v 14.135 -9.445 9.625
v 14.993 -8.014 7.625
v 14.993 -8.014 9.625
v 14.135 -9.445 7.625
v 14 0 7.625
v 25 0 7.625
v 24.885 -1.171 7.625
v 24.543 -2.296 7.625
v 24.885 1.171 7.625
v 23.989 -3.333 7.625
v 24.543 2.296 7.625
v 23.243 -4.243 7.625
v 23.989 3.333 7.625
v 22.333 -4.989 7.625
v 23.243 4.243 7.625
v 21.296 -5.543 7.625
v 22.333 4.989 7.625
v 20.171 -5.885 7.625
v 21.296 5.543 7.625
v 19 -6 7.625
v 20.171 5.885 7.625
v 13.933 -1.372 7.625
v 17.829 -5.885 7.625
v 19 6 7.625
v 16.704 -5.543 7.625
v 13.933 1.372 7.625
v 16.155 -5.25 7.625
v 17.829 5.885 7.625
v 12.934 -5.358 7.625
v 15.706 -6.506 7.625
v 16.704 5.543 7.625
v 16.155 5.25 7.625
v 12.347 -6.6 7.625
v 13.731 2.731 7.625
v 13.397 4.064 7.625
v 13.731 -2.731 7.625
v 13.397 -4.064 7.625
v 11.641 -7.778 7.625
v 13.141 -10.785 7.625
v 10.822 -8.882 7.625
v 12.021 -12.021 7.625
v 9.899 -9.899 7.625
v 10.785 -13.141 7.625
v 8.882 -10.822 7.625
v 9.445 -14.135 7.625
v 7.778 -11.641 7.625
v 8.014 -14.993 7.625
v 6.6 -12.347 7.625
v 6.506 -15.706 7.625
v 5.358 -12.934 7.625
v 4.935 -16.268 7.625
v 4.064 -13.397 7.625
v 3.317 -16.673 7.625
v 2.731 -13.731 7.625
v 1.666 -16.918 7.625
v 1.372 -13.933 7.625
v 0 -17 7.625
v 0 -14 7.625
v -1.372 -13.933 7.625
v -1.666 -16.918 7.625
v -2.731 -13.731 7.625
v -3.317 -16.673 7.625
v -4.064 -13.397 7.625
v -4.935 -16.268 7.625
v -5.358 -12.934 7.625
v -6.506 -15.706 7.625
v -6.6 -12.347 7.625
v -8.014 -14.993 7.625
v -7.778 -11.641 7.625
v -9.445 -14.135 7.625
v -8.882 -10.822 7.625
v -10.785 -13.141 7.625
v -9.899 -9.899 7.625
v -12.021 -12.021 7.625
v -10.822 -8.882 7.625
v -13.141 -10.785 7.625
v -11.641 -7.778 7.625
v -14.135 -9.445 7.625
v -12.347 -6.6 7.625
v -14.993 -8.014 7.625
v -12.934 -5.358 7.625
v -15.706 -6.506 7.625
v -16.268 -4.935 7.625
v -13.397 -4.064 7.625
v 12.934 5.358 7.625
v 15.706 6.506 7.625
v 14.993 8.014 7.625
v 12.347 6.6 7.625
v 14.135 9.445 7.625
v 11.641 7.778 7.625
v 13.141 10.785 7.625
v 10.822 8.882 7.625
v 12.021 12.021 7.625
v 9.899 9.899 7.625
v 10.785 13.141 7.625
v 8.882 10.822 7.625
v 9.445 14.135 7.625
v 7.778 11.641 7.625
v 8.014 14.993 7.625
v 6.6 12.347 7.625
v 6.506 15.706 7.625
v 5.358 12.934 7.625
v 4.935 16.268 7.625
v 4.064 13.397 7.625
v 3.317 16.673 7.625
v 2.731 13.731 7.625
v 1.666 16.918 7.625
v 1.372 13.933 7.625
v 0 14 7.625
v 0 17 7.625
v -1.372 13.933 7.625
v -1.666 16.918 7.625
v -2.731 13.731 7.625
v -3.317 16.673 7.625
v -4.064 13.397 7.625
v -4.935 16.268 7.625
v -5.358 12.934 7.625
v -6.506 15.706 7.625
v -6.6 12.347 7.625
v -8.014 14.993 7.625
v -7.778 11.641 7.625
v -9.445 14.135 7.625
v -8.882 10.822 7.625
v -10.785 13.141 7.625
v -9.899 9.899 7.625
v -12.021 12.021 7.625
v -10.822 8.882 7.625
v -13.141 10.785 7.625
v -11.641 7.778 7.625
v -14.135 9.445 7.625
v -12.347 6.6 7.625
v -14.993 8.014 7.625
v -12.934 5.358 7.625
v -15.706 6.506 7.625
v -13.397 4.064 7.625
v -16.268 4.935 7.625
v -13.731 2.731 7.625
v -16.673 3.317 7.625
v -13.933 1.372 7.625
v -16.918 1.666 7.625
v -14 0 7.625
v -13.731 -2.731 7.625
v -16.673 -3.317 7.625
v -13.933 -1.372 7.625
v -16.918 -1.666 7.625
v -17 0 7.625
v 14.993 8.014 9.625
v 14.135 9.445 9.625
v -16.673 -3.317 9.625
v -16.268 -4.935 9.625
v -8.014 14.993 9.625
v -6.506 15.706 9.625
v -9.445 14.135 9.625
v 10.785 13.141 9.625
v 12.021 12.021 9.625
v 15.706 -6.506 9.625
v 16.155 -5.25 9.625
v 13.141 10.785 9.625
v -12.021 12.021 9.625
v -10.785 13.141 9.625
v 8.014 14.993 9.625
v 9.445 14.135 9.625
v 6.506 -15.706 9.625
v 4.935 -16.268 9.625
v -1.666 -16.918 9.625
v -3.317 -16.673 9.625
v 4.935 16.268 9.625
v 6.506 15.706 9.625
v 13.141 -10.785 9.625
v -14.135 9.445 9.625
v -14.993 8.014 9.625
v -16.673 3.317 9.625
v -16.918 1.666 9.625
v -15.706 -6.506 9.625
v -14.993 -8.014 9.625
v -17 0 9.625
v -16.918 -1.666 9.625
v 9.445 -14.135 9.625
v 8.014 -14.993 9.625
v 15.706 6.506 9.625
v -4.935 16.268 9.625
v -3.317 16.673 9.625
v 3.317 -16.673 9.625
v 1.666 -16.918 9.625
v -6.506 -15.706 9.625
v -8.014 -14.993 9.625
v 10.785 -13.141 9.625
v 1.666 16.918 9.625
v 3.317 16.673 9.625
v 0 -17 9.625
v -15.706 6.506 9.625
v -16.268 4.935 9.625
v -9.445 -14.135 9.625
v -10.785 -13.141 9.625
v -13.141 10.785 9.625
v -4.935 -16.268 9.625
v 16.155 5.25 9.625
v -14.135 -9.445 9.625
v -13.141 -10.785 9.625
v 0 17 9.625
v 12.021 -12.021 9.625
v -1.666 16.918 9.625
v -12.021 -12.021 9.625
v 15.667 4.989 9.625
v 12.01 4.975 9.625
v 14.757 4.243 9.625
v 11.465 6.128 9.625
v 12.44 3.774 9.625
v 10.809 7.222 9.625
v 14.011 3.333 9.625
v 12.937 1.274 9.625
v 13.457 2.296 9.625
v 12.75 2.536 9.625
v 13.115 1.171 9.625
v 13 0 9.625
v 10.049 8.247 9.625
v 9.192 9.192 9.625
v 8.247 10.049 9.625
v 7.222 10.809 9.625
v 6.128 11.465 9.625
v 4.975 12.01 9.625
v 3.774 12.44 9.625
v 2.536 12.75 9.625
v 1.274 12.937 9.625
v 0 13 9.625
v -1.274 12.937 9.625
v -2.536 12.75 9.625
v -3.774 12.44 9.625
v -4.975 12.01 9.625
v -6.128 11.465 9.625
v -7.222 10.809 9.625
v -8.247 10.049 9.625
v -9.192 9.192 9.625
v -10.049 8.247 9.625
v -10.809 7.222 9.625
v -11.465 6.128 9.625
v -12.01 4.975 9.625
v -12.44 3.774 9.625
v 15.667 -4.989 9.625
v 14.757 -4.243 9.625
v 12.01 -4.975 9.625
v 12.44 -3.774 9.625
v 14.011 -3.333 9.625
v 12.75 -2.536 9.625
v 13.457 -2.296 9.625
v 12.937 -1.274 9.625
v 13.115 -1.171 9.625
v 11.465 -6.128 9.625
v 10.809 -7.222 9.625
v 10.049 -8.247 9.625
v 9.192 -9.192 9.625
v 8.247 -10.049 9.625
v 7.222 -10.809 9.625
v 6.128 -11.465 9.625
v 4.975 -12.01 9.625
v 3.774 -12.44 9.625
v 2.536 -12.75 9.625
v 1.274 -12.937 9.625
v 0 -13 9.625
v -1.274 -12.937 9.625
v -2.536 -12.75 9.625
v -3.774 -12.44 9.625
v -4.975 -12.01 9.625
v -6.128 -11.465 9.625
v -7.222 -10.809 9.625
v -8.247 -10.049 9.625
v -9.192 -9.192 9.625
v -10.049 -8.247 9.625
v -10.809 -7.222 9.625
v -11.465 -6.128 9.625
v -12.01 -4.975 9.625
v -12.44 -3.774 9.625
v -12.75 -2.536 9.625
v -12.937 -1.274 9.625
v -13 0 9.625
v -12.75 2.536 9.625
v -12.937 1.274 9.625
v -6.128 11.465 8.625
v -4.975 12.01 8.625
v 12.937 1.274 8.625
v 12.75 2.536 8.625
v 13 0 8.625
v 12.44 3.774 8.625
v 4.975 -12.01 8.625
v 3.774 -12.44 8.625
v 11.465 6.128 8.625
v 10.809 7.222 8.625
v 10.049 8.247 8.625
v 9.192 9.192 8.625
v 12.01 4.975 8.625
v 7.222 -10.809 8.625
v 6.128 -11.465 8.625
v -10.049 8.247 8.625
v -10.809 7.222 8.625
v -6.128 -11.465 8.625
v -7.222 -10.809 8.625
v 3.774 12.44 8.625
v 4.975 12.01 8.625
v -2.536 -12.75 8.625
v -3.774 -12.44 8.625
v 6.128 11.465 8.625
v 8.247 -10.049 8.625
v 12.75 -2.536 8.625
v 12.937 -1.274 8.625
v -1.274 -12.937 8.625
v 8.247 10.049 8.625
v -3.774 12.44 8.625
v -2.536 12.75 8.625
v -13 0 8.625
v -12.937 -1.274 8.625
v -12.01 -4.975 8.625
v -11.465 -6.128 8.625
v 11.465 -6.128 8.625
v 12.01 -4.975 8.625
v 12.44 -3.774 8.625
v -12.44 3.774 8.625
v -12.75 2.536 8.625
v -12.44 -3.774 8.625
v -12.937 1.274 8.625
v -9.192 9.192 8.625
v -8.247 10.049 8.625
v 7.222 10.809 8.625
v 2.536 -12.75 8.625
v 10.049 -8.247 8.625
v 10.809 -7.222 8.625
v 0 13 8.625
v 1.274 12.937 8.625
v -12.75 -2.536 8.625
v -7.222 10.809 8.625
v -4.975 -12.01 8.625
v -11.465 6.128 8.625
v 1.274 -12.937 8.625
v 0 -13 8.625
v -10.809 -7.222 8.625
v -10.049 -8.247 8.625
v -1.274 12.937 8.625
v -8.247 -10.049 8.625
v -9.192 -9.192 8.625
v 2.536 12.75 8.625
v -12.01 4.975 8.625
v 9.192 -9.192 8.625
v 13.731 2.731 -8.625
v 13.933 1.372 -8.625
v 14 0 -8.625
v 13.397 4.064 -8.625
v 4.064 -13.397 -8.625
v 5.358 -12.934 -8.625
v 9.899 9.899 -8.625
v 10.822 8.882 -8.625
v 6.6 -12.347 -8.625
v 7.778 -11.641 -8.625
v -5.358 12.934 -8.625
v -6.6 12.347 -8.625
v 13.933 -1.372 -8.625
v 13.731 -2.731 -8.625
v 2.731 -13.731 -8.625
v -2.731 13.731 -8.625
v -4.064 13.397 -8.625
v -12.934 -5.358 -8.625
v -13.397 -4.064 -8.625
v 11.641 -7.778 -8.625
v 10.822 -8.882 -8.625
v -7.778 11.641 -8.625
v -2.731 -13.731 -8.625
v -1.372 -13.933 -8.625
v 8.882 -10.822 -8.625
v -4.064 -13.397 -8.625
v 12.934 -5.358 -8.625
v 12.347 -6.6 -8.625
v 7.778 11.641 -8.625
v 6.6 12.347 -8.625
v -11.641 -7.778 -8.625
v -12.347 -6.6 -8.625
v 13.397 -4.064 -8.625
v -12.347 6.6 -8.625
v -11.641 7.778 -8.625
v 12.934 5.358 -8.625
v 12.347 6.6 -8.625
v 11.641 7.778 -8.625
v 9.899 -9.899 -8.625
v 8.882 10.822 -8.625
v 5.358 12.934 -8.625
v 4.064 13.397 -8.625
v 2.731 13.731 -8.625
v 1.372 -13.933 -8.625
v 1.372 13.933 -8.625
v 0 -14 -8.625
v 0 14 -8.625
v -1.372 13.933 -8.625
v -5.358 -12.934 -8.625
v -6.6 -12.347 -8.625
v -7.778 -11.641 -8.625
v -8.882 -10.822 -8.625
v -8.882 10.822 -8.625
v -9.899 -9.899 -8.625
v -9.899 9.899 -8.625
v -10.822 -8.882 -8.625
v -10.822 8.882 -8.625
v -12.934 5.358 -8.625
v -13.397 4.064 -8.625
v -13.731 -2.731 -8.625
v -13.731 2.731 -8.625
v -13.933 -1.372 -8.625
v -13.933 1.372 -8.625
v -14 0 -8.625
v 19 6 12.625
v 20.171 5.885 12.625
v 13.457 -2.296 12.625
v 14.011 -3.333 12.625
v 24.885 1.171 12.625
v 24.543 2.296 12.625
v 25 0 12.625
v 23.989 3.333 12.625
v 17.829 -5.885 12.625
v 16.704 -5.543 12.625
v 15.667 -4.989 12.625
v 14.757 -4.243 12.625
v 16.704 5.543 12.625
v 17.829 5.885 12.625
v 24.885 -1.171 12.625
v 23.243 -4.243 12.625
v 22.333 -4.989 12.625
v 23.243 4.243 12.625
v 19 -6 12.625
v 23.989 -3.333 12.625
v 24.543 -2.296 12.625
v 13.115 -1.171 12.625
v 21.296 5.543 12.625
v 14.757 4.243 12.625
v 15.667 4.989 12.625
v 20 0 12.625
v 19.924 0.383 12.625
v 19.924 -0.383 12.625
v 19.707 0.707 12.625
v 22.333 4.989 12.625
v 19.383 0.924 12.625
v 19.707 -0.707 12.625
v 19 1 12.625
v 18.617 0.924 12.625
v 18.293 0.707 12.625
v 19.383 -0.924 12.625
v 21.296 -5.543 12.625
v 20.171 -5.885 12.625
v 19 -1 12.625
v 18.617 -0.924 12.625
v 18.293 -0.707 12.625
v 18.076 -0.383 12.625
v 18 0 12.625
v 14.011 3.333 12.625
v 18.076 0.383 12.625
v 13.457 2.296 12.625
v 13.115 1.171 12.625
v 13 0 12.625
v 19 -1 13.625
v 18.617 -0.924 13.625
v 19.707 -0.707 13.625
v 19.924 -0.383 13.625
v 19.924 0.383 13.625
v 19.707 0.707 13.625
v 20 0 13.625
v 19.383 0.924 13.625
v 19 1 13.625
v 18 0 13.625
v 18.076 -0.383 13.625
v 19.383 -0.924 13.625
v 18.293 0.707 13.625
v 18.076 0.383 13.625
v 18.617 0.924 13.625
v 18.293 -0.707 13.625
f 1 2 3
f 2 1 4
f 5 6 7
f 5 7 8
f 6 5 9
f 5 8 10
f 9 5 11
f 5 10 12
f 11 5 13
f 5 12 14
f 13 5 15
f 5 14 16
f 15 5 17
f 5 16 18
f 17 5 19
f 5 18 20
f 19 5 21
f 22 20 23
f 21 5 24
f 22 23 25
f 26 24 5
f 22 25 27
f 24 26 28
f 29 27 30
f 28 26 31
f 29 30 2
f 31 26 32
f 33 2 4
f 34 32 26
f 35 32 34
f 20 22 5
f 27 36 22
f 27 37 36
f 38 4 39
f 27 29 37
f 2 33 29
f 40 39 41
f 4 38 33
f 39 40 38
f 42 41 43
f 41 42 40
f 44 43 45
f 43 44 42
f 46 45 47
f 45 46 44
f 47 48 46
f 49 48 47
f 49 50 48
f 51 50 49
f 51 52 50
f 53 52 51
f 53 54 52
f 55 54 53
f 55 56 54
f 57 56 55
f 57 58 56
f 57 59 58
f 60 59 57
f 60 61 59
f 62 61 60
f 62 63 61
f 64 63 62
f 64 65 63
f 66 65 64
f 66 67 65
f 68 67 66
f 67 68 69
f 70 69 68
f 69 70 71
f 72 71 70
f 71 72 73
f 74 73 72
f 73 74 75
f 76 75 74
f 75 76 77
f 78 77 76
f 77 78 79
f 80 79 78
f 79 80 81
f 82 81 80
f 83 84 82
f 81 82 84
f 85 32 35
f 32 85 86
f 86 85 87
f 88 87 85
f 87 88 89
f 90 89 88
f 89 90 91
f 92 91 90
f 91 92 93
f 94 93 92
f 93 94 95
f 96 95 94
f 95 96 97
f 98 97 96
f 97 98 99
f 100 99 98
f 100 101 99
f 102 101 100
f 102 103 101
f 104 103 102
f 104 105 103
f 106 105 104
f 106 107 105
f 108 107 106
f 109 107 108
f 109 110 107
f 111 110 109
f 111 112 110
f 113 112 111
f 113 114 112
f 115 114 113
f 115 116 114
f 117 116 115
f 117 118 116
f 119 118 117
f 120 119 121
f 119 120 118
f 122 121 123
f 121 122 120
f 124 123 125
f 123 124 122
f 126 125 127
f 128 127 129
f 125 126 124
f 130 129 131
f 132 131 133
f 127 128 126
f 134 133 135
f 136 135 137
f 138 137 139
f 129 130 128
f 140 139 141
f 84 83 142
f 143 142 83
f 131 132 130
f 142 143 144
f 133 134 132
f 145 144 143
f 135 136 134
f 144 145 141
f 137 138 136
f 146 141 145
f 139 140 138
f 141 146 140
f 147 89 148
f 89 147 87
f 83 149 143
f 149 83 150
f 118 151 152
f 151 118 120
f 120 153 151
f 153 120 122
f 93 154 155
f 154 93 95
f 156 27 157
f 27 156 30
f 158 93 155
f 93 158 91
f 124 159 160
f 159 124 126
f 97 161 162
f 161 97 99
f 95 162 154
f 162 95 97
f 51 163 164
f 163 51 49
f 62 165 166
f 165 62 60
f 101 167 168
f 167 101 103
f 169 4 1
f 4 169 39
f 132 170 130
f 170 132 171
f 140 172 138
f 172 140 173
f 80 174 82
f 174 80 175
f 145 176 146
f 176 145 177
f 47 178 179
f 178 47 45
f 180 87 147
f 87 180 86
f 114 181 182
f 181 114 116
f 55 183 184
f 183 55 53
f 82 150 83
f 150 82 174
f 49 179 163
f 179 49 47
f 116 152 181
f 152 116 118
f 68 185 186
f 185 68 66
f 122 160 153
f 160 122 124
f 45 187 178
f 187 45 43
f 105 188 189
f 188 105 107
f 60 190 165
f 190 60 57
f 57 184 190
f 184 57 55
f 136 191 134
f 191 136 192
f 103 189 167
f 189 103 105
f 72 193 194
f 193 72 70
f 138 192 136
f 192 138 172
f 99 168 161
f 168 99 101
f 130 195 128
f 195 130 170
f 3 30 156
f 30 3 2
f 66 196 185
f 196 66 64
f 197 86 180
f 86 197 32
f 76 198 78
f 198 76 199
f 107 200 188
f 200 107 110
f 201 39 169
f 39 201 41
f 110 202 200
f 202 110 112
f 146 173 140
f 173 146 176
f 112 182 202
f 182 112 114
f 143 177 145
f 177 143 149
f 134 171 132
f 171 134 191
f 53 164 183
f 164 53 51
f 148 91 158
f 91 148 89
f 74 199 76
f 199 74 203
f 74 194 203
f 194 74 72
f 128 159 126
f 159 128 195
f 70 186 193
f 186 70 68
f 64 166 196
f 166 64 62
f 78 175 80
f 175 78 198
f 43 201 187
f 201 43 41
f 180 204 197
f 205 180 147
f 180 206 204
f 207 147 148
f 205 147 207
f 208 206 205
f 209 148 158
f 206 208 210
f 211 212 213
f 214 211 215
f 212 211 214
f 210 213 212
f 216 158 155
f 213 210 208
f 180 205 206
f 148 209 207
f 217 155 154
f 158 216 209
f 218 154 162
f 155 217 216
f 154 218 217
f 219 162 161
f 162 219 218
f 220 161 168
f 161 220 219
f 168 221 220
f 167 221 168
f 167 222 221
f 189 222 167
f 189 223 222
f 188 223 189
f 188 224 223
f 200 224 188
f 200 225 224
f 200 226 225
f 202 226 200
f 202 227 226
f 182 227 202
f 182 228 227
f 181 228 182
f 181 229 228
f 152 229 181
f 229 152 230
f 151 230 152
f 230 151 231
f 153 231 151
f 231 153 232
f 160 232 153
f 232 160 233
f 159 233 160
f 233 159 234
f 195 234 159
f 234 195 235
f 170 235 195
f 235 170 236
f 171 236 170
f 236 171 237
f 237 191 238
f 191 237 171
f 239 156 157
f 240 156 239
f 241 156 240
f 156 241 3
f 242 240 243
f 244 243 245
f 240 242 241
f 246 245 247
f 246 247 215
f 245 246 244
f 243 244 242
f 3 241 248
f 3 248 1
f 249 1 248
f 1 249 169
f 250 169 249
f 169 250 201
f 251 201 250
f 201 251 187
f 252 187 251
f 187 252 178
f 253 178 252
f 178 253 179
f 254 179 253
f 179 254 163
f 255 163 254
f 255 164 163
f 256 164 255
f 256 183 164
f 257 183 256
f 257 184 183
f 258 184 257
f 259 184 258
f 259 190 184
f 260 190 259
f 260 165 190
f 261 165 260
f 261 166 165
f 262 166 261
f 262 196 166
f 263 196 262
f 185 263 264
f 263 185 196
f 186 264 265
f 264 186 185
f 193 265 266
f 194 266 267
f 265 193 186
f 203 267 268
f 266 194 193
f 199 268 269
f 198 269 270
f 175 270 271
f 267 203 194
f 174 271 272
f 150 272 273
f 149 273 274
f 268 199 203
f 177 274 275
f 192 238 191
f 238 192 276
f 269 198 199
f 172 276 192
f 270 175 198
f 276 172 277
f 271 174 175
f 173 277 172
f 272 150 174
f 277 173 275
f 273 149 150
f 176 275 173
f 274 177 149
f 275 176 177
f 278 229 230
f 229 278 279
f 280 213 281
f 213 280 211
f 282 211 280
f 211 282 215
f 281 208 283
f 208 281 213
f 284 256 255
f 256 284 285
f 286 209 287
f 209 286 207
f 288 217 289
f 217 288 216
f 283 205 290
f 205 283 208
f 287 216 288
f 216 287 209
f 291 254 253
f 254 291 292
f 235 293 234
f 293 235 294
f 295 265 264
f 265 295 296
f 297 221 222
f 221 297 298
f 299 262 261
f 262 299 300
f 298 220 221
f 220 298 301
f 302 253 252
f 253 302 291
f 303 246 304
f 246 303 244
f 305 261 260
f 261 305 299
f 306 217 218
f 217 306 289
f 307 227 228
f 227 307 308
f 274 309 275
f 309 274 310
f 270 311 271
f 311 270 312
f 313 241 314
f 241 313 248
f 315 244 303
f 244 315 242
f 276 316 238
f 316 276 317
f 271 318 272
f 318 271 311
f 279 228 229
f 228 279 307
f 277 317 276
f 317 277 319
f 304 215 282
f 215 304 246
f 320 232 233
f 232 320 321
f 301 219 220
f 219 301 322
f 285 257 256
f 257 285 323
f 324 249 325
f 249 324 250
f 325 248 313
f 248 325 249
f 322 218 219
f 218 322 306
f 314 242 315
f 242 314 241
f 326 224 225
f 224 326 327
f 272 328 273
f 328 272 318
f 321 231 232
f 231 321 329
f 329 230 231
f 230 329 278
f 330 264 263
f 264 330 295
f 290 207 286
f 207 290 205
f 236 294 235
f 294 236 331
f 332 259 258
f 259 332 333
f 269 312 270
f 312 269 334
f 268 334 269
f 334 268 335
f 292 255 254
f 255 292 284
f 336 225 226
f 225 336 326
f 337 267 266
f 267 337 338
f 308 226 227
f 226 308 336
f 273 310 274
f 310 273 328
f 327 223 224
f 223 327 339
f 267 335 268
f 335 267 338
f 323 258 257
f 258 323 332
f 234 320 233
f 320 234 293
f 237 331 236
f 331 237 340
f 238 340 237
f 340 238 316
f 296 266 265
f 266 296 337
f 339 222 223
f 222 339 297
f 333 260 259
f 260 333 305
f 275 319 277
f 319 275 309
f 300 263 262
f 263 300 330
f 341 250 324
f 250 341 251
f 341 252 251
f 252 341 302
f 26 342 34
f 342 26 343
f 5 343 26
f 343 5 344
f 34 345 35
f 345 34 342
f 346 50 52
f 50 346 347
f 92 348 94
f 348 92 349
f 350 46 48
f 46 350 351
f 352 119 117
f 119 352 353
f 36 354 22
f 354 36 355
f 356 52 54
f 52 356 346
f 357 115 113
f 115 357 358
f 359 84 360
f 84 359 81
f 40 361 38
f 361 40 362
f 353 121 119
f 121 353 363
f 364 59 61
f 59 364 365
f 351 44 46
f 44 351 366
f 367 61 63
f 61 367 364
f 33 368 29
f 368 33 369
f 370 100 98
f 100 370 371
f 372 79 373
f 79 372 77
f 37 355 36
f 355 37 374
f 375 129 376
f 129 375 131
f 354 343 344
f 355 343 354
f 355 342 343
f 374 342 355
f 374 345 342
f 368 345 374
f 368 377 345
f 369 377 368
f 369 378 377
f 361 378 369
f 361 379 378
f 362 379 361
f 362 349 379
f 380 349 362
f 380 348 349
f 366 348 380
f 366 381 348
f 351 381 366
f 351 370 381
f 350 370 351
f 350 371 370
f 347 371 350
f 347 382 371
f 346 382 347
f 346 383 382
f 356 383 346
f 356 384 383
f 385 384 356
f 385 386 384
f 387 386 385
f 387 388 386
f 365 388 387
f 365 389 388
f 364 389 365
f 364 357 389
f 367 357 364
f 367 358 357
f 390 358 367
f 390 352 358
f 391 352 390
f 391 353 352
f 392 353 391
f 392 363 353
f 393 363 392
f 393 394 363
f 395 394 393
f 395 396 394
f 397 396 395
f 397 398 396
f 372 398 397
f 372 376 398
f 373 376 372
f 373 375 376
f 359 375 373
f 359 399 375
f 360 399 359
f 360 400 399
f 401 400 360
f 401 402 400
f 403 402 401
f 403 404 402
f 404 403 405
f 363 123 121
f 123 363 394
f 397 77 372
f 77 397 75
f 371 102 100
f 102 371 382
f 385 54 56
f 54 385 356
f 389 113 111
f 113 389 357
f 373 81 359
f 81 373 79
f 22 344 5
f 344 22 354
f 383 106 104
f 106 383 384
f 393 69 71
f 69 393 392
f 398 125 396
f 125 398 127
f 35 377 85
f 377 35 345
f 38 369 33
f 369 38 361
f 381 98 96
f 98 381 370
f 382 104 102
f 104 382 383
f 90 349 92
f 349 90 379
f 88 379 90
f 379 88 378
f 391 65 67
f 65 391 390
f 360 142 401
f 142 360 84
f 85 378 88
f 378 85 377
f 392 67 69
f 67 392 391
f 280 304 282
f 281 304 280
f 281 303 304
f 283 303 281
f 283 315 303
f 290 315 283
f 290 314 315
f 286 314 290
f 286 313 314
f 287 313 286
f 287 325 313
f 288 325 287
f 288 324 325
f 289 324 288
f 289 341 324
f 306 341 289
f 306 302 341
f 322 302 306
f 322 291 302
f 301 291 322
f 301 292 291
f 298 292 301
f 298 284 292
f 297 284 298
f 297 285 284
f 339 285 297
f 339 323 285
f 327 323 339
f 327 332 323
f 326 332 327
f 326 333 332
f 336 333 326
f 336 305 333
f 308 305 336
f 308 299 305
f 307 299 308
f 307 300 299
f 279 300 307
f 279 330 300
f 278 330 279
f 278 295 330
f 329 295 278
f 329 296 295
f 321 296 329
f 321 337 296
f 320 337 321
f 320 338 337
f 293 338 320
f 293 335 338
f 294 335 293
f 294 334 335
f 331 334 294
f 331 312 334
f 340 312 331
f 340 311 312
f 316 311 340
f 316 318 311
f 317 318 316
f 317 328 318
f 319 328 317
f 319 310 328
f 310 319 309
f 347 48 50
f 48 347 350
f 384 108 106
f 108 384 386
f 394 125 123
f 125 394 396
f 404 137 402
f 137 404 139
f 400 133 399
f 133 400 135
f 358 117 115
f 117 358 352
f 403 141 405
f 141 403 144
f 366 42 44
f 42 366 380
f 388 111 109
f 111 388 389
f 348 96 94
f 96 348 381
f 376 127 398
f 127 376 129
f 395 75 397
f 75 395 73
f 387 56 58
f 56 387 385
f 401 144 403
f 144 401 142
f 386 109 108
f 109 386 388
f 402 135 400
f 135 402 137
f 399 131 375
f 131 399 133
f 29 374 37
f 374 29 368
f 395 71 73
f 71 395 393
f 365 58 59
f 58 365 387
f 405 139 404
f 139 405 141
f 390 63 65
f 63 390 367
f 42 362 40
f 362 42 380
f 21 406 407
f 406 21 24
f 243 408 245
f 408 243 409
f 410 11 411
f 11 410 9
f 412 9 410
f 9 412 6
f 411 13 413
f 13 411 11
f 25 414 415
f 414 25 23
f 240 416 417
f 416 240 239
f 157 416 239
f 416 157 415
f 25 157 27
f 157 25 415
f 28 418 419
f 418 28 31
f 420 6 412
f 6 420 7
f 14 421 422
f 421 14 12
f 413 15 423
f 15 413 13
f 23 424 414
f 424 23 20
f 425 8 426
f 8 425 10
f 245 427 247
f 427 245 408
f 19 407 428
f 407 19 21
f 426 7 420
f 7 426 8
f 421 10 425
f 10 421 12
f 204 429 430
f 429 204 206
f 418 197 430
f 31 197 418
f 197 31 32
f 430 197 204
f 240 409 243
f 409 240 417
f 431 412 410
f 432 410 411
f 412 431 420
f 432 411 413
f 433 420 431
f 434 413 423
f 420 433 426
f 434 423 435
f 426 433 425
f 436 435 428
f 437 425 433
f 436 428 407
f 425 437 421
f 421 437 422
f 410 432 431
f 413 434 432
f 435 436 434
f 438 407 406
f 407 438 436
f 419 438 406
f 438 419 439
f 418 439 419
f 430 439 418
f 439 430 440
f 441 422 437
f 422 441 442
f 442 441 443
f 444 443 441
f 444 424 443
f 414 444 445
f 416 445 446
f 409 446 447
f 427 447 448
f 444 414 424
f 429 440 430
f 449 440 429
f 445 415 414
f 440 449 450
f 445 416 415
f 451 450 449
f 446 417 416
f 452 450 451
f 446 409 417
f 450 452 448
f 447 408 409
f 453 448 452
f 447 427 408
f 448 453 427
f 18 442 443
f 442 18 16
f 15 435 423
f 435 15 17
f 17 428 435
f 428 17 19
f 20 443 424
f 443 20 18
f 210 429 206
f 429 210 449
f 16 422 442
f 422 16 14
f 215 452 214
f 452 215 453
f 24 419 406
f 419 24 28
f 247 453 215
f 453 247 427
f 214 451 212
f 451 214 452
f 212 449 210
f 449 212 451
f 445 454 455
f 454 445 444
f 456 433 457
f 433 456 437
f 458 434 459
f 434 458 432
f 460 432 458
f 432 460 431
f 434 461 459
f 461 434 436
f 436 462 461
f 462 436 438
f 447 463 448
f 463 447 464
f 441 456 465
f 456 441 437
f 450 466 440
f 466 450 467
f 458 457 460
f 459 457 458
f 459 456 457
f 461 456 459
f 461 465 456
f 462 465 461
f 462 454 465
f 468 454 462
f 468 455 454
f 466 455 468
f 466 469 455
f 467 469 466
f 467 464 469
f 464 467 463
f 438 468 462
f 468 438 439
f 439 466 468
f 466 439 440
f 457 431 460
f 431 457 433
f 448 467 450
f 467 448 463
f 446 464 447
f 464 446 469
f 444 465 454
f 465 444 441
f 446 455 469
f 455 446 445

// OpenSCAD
// Parameters
stator_diameter_mm = 28.0; //[14.0:56.0:0.5]
stator_height_mm = 17.25; //[8.0:35.0:0.25]
tolerance_mm = 0.2; //[0.0:1.0:0.05]
overlap_mm = 1.0; //[0.5:2.0:0.1]
central_bore_diameter_mm = 0.0; //[0.0:12.0:0.1]
shaft_diameter_mm = 0.0; //[0.0:12.0:0.1]
end_face_thickness_mm = 1.0; //[0.5:3.0:0.1]
mount_ring_thickness_mm = 2.0; //[1.0:6.0:0.25]
mount_ring_radial_mm = 3.0; //[1.0:10.0:0.25]
buzzer_diameter_mm = 12.0; //[6.0:24.0:0.5]
buzzer_height_mm = 5.0; //[2.0:12.0:0.25]
buzzer_pin_diameter_mm = 2.0; //[1.0:3.0:0.1]
buzzer_pin_height_mm = 2.0; //[0.5:6.0:0.25]

// Buzzer - complete geometry
module buzzer() {
  color([0.85, 0.85, 0.8]) {
    // Buzzer body
    translate([stator_diameter_mm/2 + buzzer_diameter_mm/2 - overlap_mm, 0, stator_height_mm/2 + buzzer_height_mm/2 - overlap_mm])
      cylinder(r=buzzer_diameter_mm/2, h=buzzer_height_mm, center=true, $fn=32);
    // Buzzer pin
    translate([stator_diameter_mm/2 + buzzer_diameter_mm/2 - overlap_mm, 0, stator_height_mm/2 + buzzer_height_mm - overlap_mm])
      cylinder(r=buzzer_pin_diameter_mm/2, h=buzzer_pin_height_mm, center=true, $fn=16);
  }
}

// Stator with end faces and mounting interface
module stator_with_end_faces_and_mount() {
  color("DimGray") {
    // Stator cylinder
    cylinder(r=stator_diameter_mm/2, h=stator_height_mm, center=true, $fn=64);
    // End face top
    translate([0, 0, stator_height_mm/2 + end_face_thickness_mm/2 - overlap_mm])
      cylinder(r=stator_diameter_mm/2, h=end_face_thickness_mm, center=true, $fn=64);
    // End face bottom
    translate([0, 0, -stator_height_mm/2 - end_face_thickness_mm/2 + overlap_mm])
      cylinder(r=stator_diameter_mm/2, h=end_face_thickness_mm, center=true, $fn=64);
    // Mounting interface
    difference() {
      translate([0, 0, stator_height_mm/2 + mount_ring_thickness_mm/2 - overlap_mm])
        cylinder(r=stator_diameter_mm/2 + mount_ring_radial_mm, h=mount_ring_thickness_mm, center=true, $fn=64);
      translate([0, 0, stator_height_mm/2 + mount_ring_thickness_mm/2 - overlap_mm])
        cylinder(r=stator_diameter_mm/2 - overlap_mm, h=mount_ring_thickness_mm + 2*overlap_mm, center=true, $fn=64);
    }
  }
}

// Final assembly
module assembly() {
  difference() {
    union() {
      stator_with_end_faces_and_mount();
      buzzer();
    }
    // Central bore or shaft clearance
    if (max(central_bore_diameter_mm, shaft_diameter_mm) > 0) {
      cylinder(r=max(central_bore_diameter_mm, shaft_diameter_mm)/2 + tolerance_mm, h=stator_height_mm + 2*overlap_mm, center=true, $fn=64);
    }
  }
}

assembly();
